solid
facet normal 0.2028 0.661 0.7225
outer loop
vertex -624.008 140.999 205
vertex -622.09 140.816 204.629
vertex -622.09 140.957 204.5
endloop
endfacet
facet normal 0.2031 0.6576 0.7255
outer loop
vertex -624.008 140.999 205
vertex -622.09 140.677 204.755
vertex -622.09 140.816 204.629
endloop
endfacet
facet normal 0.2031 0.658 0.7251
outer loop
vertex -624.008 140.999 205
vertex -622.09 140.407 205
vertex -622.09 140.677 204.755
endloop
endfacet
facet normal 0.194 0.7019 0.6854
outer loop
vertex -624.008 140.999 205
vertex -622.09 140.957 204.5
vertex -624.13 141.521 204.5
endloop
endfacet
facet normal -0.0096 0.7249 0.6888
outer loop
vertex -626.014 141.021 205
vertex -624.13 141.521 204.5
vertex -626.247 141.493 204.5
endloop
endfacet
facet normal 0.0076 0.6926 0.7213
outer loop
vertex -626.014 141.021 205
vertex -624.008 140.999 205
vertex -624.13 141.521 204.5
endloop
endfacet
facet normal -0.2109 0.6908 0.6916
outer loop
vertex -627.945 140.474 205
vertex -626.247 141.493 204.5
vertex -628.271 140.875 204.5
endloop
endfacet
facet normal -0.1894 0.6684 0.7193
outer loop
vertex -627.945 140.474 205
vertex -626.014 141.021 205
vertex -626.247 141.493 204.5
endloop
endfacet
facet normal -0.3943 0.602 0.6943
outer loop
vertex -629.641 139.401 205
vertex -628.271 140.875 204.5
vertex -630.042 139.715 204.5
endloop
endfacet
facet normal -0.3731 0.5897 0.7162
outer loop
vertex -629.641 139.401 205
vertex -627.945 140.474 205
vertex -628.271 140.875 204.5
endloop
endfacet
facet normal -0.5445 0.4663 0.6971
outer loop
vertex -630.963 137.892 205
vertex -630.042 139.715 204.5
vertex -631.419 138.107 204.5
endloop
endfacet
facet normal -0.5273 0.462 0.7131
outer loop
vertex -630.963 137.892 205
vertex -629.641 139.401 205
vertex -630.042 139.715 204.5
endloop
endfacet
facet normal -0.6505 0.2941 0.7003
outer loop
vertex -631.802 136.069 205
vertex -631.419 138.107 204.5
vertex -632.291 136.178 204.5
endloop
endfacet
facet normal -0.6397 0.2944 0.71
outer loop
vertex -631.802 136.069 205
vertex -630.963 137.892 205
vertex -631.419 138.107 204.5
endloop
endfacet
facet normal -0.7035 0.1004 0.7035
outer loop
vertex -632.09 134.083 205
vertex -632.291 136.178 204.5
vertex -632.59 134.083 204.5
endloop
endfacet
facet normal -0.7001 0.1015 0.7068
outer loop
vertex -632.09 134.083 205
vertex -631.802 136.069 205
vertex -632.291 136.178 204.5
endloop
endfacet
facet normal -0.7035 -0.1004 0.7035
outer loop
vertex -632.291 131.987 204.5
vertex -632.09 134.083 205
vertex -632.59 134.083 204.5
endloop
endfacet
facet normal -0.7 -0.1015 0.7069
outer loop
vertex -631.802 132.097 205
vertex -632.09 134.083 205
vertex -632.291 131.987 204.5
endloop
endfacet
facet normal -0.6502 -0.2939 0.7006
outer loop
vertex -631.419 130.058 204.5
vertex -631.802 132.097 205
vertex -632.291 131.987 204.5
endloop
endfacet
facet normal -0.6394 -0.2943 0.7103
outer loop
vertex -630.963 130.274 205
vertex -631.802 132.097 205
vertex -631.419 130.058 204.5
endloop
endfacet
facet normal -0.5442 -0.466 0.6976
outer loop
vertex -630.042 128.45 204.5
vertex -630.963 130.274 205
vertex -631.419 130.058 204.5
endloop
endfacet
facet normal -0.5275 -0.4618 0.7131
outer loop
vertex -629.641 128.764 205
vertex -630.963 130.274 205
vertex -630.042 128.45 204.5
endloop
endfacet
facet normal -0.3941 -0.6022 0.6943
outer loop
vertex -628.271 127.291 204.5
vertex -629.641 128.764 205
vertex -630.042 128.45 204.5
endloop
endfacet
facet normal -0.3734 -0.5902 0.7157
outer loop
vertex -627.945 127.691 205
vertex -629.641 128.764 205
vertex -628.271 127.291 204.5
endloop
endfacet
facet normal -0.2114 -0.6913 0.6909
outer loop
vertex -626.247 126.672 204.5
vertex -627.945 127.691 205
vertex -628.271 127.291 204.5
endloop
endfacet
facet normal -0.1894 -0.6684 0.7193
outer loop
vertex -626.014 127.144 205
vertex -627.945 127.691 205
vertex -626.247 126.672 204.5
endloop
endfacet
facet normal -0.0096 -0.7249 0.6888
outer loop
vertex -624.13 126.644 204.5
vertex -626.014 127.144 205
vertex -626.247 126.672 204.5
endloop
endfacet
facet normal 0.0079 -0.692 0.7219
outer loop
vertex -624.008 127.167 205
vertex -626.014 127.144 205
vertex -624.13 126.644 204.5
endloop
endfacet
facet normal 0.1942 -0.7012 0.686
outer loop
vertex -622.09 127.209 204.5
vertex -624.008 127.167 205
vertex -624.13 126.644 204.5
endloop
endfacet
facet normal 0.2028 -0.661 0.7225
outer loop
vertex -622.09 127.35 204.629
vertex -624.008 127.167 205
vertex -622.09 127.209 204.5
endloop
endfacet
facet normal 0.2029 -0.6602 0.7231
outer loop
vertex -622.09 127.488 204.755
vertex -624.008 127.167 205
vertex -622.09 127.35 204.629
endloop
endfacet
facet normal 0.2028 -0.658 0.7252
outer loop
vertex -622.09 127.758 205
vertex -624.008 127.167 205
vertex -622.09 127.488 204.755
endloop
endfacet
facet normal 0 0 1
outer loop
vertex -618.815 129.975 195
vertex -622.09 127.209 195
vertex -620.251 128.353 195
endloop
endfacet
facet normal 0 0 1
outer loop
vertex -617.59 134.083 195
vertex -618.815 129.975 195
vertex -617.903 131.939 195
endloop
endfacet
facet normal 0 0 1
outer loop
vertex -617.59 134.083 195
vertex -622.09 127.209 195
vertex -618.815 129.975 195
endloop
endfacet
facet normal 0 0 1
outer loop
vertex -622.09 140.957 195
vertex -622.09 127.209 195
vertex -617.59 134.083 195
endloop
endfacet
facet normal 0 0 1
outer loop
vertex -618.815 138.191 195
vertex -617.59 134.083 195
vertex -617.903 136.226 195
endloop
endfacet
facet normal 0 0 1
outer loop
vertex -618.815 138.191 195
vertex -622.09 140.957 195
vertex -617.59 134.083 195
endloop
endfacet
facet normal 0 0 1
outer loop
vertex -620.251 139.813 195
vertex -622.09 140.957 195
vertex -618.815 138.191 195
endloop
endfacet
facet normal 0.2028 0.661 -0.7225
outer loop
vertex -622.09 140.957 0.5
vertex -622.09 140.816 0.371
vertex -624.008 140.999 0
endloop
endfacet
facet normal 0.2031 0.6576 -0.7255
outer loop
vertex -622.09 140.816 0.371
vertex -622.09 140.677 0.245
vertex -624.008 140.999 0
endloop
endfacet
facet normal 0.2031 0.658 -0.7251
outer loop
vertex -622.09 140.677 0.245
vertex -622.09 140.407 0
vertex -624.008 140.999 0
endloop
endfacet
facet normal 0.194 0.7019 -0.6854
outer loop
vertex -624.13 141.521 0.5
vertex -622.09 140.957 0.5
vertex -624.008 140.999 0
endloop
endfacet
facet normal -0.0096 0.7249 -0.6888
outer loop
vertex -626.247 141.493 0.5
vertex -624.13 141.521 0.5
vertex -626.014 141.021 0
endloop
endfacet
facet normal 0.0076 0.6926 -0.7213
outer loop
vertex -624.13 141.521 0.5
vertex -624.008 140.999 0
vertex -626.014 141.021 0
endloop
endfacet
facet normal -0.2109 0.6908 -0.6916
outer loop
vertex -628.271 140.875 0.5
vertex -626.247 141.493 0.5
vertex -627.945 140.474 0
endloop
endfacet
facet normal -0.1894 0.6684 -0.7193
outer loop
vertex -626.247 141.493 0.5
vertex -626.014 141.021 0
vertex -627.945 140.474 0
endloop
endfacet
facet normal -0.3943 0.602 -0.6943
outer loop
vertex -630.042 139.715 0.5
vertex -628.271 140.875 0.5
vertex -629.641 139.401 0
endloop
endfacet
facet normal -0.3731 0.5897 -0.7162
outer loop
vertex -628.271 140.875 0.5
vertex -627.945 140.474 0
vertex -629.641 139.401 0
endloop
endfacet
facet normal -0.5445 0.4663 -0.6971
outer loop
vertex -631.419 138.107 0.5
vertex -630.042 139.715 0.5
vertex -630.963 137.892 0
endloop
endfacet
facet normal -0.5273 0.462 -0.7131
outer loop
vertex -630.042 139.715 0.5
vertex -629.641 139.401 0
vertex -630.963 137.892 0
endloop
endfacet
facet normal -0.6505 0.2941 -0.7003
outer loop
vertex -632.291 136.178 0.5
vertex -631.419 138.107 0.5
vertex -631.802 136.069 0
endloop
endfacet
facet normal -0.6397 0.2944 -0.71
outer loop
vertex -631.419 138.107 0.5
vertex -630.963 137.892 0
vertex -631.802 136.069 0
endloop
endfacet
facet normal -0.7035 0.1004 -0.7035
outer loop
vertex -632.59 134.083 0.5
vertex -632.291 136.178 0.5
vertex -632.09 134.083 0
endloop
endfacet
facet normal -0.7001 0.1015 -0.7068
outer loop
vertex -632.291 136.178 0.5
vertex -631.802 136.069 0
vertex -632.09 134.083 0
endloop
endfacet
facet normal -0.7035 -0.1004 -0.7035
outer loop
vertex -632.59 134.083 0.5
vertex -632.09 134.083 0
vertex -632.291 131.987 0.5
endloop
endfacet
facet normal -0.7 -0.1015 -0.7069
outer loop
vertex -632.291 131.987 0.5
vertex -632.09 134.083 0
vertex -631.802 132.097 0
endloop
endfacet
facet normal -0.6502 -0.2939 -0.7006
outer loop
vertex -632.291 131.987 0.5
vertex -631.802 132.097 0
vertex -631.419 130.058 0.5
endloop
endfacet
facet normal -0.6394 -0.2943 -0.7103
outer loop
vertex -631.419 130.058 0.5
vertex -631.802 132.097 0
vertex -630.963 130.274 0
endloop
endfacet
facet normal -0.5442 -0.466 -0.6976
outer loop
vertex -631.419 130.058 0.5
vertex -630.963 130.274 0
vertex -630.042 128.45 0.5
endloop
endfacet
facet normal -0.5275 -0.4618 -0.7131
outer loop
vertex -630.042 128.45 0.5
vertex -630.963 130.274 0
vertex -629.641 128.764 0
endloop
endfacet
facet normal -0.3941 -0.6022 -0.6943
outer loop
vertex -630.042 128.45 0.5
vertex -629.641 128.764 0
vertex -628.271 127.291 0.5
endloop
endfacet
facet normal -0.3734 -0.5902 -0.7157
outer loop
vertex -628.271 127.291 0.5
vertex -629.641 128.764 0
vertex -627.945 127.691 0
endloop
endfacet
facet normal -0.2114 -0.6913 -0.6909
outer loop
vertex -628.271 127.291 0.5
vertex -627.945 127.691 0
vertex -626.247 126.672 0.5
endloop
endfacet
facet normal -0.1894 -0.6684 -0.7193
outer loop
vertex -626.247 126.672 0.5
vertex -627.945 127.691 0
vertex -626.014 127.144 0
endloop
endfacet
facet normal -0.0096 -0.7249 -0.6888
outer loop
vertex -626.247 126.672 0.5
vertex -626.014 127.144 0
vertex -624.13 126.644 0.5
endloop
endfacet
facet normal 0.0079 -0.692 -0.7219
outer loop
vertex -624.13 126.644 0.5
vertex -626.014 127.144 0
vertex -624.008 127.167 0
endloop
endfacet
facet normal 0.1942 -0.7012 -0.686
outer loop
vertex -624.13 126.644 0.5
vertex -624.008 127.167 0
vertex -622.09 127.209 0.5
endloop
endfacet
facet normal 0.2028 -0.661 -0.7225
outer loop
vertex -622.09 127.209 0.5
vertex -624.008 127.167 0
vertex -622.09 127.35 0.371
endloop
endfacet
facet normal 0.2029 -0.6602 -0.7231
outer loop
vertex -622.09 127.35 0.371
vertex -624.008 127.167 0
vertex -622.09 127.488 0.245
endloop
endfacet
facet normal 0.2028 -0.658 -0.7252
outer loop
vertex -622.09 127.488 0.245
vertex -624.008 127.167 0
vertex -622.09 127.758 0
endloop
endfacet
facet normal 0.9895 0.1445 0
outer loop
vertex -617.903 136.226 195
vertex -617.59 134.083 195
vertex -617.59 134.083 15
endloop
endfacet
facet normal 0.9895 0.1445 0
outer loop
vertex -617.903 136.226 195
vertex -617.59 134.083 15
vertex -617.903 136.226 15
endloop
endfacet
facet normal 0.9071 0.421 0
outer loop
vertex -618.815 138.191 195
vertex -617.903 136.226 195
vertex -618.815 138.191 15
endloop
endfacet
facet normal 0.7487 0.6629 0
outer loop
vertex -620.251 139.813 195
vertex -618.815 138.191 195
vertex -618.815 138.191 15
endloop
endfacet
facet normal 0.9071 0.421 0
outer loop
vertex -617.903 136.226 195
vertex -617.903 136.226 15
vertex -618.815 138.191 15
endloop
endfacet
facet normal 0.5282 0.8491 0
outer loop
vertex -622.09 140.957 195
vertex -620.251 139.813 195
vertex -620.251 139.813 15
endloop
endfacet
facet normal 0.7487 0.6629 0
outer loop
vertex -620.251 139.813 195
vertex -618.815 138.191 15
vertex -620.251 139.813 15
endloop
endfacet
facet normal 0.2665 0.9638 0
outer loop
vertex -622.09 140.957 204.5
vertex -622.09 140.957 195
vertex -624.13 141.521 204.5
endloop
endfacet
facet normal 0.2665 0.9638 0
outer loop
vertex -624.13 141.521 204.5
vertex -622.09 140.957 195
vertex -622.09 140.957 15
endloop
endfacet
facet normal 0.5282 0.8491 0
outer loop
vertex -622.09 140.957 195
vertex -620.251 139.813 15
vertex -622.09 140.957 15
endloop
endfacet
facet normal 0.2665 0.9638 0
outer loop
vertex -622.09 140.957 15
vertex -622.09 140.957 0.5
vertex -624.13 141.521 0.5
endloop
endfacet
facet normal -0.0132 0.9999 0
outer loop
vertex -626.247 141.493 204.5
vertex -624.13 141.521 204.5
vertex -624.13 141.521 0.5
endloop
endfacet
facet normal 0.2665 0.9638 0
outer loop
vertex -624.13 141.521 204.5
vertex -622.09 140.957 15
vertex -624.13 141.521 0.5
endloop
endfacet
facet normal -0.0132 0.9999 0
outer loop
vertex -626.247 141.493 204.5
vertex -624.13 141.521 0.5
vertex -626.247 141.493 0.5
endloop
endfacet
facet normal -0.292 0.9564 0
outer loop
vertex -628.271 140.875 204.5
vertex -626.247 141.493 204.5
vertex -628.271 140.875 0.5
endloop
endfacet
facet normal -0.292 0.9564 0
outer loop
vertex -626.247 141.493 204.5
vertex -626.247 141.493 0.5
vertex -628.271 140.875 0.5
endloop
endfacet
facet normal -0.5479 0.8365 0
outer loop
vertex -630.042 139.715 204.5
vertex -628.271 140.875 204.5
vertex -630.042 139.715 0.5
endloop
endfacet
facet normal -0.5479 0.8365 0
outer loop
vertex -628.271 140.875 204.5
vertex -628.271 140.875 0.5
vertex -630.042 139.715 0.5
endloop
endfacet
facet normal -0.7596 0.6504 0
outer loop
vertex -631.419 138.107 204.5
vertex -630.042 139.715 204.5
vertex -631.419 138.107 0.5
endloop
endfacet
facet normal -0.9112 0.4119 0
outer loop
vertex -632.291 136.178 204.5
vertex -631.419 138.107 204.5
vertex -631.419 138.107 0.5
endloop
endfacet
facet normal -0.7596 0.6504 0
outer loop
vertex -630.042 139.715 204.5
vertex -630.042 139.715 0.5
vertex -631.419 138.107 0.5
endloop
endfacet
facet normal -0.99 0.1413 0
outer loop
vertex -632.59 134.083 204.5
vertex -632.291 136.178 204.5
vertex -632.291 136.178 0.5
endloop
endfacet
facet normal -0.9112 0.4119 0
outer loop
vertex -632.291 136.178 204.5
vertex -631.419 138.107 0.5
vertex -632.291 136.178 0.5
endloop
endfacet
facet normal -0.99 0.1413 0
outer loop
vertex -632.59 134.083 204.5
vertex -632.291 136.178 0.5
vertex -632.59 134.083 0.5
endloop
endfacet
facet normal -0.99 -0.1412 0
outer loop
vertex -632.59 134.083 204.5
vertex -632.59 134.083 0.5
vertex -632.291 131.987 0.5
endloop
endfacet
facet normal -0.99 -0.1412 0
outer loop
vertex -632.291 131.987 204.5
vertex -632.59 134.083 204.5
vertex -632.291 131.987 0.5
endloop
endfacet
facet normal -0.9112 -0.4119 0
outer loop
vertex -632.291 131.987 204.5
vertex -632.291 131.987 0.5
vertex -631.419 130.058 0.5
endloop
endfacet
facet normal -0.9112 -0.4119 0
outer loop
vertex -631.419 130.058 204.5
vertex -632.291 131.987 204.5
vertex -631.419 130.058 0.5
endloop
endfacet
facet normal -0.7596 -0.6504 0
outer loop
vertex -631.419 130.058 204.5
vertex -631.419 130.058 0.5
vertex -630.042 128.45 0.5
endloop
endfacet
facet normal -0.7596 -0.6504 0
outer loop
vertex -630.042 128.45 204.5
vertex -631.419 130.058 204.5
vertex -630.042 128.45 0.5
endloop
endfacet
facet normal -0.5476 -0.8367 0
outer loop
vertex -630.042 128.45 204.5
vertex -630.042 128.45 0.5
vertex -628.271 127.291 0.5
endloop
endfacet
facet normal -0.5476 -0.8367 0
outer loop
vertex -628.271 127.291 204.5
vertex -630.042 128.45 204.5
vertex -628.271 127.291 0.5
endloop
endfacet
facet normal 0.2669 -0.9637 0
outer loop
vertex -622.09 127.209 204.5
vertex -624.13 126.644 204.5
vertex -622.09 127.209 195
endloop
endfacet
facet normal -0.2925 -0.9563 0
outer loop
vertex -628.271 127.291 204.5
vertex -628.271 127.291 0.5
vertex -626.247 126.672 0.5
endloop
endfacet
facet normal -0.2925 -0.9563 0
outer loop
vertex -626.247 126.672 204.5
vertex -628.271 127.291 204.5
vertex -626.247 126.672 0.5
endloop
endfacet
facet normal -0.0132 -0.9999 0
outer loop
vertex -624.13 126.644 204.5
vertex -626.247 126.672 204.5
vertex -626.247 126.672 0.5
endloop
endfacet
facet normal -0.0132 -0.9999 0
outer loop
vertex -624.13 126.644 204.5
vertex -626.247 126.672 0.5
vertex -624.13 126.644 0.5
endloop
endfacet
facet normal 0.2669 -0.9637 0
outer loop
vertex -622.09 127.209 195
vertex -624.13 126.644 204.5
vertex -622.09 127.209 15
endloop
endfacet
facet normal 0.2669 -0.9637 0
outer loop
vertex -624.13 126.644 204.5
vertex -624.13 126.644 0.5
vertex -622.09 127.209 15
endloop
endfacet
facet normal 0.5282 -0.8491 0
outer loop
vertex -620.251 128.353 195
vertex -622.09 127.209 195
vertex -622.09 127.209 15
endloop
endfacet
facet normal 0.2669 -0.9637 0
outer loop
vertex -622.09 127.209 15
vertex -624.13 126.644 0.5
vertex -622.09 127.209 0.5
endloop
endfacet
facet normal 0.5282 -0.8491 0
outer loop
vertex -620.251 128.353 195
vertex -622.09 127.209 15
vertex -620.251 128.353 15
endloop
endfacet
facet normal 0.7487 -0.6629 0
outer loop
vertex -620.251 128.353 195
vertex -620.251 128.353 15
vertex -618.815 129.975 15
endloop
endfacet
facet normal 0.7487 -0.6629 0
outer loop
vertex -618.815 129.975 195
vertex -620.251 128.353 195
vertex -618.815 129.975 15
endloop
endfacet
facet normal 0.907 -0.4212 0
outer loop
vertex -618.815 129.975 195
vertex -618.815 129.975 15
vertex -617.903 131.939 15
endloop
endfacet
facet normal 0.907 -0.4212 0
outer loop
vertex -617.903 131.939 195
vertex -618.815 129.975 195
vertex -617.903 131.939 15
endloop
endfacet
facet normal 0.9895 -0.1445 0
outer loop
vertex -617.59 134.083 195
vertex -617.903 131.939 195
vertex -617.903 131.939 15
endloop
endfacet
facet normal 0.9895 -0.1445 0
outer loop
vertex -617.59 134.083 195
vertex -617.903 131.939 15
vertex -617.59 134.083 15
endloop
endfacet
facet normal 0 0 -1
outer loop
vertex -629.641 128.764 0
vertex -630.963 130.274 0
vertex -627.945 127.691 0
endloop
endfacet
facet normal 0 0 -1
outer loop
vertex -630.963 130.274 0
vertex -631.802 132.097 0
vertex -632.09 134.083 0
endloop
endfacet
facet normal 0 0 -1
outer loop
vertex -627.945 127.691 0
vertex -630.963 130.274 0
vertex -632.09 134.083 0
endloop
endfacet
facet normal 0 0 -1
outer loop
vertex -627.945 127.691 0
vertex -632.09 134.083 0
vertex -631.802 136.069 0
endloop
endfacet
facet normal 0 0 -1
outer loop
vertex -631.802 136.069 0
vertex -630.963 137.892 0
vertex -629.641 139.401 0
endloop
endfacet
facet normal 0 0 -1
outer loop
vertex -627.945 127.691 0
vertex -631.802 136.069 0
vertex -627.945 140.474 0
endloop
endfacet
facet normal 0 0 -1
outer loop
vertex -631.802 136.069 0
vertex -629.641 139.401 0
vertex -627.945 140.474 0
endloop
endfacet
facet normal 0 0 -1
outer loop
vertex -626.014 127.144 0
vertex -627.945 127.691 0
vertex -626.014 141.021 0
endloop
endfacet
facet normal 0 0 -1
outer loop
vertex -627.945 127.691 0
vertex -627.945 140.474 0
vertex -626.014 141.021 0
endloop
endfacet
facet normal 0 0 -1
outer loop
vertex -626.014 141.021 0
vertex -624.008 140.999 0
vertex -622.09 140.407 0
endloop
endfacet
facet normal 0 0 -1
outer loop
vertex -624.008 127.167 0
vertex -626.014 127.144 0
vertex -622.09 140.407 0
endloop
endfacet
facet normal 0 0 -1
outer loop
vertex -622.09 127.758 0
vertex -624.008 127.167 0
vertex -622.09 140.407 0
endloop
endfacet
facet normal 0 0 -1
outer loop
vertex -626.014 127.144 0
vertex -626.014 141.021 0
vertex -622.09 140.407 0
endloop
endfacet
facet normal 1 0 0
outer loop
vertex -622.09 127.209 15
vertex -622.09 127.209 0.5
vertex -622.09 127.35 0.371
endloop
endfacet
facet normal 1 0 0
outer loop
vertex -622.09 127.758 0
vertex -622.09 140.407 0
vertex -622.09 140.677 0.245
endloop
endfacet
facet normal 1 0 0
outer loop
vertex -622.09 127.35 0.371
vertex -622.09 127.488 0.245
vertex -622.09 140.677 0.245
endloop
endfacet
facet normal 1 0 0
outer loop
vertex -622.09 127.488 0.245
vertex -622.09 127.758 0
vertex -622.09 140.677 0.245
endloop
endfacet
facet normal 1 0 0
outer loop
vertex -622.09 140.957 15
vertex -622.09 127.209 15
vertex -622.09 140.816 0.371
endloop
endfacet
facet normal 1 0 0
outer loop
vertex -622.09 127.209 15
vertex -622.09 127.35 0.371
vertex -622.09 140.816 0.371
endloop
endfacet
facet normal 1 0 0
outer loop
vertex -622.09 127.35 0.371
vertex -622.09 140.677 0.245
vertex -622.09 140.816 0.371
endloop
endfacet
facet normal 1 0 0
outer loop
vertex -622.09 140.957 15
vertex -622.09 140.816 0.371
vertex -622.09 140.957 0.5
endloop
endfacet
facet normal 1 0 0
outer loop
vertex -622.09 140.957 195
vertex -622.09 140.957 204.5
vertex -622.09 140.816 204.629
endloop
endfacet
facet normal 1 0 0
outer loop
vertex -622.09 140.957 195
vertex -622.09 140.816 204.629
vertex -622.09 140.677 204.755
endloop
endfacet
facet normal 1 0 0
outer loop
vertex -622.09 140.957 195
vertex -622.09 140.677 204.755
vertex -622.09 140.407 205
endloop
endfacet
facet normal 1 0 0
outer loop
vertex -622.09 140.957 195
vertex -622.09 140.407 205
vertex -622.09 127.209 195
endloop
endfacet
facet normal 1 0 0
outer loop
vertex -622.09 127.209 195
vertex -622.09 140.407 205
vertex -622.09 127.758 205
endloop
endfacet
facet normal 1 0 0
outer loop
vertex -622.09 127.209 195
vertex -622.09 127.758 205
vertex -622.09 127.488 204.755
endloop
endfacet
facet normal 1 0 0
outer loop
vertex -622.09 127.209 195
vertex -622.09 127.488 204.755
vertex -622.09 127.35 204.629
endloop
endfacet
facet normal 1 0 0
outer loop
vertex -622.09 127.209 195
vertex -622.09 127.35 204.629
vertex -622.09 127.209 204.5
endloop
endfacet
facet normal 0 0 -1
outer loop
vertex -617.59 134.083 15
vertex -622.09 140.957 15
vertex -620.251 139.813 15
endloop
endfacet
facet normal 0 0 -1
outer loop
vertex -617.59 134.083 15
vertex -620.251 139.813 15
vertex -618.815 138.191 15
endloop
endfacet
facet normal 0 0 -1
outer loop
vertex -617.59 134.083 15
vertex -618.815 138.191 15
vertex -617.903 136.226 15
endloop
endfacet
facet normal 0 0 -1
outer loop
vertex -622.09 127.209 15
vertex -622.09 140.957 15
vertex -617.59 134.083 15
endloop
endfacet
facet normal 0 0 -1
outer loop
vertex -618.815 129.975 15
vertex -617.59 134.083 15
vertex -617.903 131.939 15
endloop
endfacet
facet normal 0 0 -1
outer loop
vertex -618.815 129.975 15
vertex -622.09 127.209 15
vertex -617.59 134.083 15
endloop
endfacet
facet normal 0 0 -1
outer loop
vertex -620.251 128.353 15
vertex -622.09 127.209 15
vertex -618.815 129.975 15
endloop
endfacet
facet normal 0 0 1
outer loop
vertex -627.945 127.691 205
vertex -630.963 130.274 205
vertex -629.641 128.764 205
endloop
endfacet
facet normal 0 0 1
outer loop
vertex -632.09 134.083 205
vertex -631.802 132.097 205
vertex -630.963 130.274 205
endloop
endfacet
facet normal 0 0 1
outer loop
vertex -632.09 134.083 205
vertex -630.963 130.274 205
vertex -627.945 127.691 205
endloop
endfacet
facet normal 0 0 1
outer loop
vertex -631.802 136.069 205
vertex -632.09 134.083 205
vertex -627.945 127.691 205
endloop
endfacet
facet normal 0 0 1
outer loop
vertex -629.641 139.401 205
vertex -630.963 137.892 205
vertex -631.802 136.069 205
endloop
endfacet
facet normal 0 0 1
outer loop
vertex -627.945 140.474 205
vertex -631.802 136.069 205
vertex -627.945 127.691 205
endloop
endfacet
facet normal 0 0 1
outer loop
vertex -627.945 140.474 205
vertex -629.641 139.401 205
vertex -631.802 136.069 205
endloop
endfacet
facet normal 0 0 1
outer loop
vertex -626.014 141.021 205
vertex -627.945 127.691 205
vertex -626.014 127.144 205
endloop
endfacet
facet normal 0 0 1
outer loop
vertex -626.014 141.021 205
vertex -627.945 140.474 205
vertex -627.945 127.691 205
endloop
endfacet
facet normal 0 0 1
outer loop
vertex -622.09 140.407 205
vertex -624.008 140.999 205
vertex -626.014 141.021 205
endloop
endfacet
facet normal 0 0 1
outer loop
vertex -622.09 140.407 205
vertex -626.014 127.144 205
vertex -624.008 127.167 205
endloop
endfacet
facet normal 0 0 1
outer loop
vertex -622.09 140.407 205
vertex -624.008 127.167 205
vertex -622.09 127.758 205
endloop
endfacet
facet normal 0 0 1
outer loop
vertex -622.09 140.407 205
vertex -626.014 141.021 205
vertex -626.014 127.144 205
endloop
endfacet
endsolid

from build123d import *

# Parameters (mm, degrees)
F0_R     = 7.5
F1_DEPTH = 205
F4_DEPTH = 10
F5_DEPTH = 15
F6_SIZE  = 0.5


with BuildPart() as f1:
    # F0 (on Top) → F1 (new body)
    with BuildSketch(Plane.XY):
        with Locations((-625.089943409, 134.0827345848)):
            Circle(F0_R)
    extrude(amount=F1_DEPTH)

    # F2 (on face) → F4 (cut)
    with BuildSketch(Plane.XY.offset(205)):
        with BuildLine():
            ThreePointArc((-617.589943409, 134.0827345848), (-618.81499321, 138.1906537661), (-622.089943409, 140.9565981272))
            Line((-622.089943409, 140.9565981272), (-622.089943409, 127.2088710424))
            ThreePointArc((-622.089943409, 127.2088710424), (-618.81499321, 129.9748154035), (-617.589943409, 134.0827345848))
        make_face()
    extrude(amount=-F4_DEPTH, mode=Mode.SUBTRACT)

    # F3 (on face) → F5 (cut)
    with BuildSketch(Plane(origin=(0, 0, 0), x_dir=(1, 0, 0), z_dir=(0, 0, -1))):
        with BuildLine():
            ThreePointArc((-617.589943409, -134.0827345848), (-618.81499321, -129.9748154035), (-622.089943409, -127.2088710424))
            Line((-622.089943409, -127.2088710424), (-622.089943409, -140.9565981272))
            ThreePointArc((-622.089943409, -140.9565981272), (-618.81499321, -138.1906537661), (-617.589943409, -134.0827345848))
        make_face()
    extrude(amount=-F5_DEPTH, mode=Mode.SUBTRACT)

    # F6
    f6_edges = [f1.edges().sort_by_distance(p)[0] for p in [
        (-632.589943, 134.082735, 0),
        (-632.589943, 134.082735, 205),
    ]]
    chamfer(f6_edges, length=F6_SIZE)


solid = f1.part
